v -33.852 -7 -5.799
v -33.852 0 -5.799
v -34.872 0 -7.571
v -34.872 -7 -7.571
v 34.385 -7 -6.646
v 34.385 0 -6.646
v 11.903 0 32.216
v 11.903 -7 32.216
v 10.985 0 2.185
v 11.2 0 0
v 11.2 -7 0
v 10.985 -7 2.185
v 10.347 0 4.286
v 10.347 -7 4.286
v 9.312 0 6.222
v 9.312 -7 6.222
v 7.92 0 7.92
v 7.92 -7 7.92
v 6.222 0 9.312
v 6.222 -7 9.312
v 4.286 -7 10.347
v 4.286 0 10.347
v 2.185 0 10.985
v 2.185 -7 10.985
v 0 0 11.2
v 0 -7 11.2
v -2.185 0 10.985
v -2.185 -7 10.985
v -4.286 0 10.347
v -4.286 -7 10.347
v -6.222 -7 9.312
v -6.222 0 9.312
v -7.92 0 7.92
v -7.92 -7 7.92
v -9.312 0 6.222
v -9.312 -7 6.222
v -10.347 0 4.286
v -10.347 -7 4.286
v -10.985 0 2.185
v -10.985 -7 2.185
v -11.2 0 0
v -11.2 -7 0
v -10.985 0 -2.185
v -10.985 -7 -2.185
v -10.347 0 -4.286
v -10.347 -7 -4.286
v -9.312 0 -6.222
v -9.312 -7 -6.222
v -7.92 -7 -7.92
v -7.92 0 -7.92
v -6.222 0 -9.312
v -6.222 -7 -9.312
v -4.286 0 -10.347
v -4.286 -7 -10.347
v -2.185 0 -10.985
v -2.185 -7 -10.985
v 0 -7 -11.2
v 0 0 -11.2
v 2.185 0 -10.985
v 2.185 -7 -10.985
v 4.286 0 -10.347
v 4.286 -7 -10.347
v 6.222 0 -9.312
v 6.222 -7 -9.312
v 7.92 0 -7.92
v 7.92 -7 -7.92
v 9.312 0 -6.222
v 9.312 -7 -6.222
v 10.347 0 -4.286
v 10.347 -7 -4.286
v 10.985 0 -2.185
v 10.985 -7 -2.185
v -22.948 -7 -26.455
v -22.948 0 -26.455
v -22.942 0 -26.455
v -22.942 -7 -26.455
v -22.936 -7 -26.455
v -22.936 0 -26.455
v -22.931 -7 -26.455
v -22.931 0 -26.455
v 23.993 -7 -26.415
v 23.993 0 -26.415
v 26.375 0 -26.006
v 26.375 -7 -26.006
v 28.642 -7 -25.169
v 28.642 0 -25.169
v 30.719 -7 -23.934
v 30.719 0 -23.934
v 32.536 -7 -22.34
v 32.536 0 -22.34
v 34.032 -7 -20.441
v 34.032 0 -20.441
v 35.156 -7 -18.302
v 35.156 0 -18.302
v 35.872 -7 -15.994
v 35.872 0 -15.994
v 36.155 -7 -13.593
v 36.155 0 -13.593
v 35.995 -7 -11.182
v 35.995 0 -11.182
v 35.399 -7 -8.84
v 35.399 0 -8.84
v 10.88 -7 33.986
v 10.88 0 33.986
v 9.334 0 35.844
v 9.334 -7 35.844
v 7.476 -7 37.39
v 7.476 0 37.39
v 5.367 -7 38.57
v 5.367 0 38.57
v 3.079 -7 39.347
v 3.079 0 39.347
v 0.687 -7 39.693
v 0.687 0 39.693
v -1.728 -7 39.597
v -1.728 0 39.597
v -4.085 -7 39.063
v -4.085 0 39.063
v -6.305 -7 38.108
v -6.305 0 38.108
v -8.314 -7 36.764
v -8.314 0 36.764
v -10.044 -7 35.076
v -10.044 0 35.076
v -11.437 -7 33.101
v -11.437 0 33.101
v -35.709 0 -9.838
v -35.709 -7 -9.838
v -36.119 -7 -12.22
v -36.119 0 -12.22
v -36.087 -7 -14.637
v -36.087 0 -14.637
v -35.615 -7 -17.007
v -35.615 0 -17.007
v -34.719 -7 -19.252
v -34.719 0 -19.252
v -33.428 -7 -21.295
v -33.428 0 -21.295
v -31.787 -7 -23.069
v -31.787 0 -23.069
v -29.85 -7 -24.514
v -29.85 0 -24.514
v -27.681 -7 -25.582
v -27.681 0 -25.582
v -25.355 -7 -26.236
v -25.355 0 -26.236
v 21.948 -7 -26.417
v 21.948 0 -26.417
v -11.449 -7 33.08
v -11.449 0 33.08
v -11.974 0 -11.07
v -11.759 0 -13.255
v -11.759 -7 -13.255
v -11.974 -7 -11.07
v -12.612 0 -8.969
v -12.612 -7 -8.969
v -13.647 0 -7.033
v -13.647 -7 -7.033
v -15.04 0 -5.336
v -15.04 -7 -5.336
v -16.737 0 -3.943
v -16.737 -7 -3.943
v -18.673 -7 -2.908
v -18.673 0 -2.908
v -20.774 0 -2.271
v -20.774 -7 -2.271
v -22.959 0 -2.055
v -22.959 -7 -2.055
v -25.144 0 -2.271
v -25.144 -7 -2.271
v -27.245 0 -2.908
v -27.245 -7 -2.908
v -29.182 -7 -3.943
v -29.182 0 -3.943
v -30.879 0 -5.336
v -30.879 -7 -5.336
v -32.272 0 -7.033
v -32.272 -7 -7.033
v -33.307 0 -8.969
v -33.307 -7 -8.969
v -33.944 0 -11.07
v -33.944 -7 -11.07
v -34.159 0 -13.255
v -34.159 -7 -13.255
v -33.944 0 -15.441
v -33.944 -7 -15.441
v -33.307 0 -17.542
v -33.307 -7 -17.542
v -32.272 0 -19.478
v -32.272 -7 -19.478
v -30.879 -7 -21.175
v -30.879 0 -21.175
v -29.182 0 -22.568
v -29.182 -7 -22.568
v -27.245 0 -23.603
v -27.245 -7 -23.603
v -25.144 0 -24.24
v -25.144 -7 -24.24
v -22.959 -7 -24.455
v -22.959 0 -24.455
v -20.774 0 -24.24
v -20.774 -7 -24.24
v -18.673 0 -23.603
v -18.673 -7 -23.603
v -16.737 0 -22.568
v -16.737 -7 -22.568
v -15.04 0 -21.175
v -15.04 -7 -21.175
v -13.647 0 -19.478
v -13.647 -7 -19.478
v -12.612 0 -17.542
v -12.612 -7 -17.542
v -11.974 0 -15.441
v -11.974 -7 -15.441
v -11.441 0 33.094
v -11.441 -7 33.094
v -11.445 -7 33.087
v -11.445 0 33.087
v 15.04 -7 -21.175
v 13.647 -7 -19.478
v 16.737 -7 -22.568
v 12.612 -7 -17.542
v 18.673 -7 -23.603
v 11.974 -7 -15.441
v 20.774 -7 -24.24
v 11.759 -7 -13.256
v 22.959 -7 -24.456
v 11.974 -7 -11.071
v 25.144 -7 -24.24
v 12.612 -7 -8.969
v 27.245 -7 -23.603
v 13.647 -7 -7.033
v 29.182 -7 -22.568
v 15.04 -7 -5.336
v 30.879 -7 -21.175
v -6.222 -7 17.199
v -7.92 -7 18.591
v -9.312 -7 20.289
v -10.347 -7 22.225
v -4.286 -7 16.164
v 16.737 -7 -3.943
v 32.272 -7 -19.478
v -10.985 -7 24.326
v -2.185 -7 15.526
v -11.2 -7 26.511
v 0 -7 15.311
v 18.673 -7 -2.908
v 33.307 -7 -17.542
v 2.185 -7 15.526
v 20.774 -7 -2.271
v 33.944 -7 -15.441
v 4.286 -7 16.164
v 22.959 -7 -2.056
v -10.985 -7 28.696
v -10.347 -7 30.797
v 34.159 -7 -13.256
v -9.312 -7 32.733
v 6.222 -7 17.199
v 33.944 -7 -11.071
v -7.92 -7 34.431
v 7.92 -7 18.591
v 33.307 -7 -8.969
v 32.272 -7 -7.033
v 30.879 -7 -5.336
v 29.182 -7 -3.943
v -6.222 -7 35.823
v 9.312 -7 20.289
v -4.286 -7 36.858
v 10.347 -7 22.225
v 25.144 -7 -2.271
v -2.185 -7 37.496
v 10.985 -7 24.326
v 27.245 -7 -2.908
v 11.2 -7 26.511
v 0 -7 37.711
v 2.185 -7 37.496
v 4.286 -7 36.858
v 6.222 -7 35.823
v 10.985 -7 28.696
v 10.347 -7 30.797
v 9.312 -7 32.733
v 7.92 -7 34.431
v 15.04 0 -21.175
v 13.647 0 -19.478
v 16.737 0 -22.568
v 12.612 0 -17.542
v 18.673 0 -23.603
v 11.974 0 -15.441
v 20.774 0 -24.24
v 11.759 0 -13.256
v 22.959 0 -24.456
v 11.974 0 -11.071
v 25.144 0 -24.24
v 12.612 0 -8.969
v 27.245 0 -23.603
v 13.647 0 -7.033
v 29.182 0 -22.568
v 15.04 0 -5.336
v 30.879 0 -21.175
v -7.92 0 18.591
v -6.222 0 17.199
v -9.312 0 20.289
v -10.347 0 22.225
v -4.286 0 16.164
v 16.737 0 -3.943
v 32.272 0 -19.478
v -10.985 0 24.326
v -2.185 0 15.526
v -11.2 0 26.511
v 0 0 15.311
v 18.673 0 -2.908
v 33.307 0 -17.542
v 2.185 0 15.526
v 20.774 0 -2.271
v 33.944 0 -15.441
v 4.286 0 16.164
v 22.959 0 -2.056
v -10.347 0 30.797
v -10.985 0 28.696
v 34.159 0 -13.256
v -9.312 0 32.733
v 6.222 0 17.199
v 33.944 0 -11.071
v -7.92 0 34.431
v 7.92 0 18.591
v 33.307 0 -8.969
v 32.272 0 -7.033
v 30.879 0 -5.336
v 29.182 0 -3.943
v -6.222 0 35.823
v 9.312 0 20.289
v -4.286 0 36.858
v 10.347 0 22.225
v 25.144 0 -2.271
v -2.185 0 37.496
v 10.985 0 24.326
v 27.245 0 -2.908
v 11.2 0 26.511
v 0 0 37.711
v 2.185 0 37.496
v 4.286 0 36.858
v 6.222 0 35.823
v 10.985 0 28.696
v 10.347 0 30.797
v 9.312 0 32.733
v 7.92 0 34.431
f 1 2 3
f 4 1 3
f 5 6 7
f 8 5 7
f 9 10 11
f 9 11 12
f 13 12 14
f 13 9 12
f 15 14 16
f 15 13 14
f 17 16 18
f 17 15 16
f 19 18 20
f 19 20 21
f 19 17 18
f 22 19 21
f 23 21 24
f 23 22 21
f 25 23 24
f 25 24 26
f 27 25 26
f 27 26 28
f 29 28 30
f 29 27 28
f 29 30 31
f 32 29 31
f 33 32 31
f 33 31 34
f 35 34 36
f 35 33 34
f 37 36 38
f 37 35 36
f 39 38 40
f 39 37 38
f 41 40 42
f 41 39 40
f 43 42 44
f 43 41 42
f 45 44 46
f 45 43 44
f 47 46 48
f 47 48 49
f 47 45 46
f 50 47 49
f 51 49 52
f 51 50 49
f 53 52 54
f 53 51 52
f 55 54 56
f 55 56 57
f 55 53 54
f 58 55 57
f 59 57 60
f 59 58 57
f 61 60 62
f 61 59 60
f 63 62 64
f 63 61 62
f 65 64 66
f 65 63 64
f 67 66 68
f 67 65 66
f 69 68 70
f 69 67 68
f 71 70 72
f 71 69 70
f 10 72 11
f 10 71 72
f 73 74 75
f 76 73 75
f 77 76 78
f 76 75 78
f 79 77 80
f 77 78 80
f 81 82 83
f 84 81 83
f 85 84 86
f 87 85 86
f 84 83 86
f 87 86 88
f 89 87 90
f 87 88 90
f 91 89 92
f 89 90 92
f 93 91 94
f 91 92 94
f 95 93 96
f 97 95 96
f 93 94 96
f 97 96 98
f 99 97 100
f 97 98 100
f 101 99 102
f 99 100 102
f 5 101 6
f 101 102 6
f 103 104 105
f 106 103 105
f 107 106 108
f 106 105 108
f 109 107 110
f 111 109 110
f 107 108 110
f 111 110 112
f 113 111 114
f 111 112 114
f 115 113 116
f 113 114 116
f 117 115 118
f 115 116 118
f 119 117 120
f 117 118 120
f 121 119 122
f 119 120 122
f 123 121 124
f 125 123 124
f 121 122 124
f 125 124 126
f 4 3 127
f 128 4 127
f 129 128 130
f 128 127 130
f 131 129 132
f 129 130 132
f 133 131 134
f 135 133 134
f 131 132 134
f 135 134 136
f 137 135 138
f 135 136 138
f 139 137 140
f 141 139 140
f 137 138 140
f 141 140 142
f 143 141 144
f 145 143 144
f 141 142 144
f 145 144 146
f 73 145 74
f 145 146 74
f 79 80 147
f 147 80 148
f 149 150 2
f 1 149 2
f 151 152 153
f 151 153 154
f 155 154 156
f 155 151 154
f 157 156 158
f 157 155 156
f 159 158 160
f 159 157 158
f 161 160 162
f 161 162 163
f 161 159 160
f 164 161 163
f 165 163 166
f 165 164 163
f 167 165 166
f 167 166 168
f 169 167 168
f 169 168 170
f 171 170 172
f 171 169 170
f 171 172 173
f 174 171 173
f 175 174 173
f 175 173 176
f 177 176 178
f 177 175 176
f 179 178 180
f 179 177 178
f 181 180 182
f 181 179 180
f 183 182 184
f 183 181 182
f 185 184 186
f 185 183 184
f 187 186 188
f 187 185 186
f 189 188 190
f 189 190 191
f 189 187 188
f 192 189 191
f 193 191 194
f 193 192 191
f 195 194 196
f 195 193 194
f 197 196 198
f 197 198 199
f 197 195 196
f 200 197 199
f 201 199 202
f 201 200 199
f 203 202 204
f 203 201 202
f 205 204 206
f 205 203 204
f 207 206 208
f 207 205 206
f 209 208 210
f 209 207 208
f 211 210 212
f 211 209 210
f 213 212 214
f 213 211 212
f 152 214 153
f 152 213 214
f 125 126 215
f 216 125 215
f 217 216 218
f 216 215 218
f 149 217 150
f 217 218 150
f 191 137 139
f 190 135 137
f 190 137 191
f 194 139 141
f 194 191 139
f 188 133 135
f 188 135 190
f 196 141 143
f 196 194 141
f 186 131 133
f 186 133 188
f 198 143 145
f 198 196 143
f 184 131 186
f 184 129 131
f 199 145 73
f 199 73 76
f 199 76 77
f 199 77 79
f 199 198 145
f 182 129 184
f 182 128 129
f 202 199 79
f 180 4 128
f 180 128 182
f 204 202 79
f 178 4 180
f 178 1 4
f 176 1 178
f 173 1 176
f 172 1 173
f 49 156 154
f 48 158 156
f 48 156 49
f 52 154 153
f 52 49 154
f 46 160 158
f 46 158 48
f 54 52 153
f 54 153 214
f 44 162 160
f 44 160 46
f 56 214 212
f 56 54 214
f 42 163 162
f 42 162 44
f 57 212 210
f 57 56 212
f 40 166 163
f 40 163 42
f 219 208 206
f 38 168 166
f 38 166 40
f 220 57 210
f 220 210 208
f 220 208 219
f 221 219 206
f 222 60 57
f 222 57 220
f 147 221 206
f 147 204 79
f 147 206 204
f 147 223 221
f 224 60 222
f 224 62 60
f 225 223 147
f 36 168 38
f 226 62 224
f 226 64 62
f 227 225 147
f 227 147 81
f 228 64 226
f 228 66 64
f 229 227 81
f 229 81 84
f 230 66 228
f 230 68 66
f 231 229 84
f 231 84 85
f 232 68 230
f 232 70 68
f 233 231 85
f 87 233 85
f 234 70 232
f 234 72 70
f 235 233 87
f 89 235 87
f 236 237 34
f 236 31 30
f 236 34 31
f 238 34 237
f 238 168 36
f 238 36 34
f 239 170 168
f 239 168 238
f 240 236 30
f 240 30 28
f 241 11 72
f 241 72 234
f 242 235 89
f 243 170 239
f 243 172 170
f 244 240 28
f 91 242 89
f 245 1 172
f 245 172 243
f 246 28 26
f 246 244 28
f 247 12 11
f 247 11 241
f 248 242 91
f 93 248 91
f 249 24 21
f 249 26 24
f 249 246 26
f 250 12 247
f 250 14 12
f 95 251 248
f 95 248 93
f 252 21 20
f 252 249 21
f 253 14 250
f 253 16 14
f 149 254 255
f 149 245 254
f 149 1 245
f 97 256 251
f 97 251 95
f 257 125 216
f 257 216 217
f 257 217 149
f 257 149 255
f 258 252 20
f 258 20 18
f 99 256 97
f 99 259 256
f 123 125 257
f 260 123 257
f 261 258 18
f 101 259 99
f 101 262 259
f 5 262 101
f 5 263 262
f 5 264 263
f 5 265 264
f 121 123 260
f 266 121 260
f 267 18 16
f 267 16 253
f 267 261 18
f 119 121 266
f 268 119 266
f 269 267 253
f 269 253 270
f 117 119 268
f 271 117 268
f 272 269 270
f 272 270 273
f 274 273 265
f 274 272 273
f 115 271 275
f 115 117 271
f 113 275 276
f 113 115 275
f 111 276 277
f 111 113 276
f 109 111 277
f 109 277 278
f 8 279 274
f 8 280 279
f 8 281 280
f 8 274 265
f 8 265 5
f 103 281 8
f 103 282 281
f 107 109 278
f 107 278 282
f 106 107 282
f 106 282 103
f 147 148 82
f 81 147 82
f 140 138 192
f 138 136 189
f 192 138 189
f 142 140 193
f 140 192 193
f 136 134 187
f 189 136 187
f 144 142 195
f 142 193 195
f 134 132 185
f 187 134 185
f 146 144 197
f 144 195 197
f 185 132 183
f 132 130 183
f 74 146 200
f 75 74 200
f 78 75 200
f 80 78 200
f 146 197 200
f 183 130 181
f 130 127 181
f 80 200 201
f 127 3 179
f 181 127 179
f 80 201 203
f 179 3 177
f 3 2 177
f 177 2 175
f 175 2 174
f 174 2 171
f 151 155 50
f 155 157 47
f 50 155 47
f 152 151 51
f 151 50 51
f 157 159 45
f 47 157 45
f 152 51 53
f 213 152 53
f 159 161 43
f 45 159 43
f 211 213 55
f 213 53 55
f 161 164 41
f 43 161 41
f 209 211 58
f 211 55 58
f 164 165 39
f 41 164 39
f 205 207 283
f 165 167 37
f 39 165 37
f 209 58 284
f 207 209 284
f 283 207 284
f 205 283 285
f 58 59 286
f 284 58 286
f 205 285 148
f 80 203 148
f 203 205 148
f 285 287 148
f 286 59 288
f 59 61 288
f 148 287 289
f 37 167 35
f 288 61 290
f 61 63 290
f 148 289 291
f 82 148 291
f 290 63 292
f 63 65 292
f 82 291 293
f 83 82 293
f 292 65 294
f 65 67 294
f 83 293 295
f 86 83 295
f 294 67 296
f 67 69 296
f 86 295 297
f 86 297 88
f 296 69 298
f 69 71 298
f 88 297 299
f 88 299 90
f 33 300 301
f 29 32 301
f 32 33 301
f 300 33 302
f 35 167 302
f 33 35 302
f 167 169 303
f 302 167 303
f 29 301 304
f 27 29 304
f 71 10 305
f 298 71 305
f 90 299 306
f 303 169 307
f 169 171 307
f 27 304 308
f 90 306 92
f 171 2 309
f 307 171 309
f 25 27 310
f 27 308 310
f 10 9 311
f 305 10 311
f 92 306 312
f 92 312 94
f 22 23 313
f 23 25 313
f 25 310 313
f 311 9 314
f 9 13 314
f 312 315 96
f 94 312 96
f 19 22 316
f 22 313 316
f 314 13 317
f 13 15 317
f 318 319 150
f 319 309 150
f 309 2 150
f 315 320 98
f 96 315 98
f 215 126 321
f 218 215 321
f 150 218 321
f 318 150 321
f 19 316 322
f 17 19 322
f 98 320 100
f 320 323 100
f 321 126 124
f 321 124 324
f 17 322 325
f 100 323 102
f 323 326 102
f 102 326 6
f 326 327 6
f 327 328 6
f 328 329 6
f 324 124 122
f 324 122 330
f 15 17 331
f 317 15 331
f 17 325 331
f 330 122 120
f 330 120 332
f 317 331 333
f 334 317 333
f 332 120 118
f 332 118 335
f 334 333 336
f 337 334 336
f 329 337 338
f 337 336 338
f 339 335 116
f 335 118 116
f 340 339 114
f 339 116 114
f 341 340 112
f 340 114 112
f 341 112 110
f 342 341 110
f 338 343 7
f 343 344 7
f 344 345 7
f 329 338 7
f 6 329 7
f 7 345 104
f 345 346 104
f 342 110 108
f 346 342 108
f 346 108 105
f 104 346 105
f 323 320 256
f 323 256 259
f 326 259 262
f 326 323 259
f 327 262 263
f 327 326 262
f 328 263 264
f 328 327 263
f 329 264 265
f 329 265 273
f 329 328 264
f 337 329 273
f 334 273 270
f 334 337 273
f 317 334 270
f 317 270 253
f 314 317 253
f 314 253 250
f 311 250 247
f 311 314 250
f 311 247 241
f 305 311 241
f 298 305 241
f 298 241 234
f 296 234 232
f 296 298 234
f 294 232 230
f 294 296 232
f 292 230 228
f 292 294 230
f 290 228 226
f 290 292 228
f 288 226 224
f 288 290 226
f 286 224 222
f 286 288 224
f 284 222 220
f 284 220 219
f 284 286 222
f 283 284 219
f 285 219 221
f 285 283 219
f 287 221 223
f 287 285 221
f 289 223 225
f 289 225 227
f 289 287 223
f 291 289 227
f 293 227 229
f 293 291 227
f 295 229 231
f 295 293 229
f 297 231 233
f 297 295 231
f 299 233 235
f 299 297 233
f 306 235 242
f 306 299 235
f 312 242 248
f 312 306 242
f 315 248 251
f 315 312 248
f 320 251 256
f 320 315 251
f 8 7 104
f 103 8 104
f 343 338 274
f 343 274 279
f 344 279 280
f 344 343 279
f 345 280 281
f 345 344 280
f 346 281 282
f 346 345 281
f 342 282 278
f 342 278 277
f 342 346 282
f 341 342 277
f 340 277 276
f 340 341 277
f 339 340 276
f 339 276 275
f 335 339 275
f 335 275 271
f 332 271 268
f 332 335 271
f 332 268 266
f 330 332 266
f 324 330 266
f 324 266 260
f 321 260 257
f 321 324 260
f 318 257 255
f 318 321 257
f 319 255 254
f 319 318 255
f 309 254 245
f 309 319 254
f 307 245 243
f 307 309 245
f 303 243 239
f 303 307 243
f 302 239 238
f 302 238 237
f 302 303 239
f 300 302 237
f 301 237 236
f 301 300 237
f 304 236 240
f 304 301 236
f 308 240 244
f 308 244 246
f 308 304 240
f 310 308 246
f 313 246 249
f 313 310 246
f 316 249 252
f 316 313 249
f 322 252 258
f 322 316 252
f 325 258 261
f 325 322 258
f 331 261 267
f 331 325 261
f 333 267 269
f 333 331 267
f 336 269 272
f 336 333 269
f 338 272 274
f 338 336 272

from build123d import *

# Parameters (mm, degrees)
F0_R     = 11.2
F1_DEPTH = 7


# Not quite as in the source:
# - ends of sketch curves that miss each other by under 0.0002 mm in the source are joined


with BuildPart() as f1:
    # F0 (on Front) → F1 (new body)
    with BuildSketch(Plane.XZ):
        with BuildLine():
            Line((34.3850237921, -6.6456524925), (11.9034600857, 32.216063506))
            Line((11.9034600857, 32.216063506), (10.8795652547, 33.9859719811))
            ThreePointArc((10.8795652547, 33.9859719811), (-0.5229512338, 39.7006466997), (-11.4372271683, 33.1011413973))
            ThreePointArc((-11.4372271683, 33.1011413973), (-11.443253047, 33.0906723652), (-11.449269343, 33.0801978231))
            Line((-11.449269343, 33.0801978231), (-33.8515173907, -5.7990863826))
            Line((-33.8515173907, -5.7990863826), (-34.8724977352, -7.5710060978))
            ThreePointArc((-34.8724977352, -7.5710060978), (-34.1203065589, -20.3032101841), (-22.9478157697, -26.4554889214))
            ThreePointArc((-22.9478157697, -26.4554889214), (-22.9392839252, -26.4554787883), (-22.930752089, -26.4554631407))
            Line((-22.930752089, -26.4554631407), (21.9480379364, -26.4167307195))
            Line((21.9480379364, -26.4167307195), (23.9929324806, -26.4149658832))
            ThreePointArc((23.9929324806, -26.4149658832), (34.6432297092, -19.3974365399), (34.3850237921, -6.6456524925))
        make_face()
        with Locations((-22.9592271072, -13.2554938539)):
            Circle(F0_R, mode=Mode.SUBTRACT)
        with Locations((22.9591888153, -13.2555159617)):
            Circle(F0_R, mode=Mode.SUBTRACT)
        Circle(F0_R, mode=Mode.SUBTRACT)
        with Locations((0, 26.5110097826)):
            Circle(F0_R, mode=Mode.SUBTRACT)
    extrude(amount=F1_DEPTH)


solid = f1.part
